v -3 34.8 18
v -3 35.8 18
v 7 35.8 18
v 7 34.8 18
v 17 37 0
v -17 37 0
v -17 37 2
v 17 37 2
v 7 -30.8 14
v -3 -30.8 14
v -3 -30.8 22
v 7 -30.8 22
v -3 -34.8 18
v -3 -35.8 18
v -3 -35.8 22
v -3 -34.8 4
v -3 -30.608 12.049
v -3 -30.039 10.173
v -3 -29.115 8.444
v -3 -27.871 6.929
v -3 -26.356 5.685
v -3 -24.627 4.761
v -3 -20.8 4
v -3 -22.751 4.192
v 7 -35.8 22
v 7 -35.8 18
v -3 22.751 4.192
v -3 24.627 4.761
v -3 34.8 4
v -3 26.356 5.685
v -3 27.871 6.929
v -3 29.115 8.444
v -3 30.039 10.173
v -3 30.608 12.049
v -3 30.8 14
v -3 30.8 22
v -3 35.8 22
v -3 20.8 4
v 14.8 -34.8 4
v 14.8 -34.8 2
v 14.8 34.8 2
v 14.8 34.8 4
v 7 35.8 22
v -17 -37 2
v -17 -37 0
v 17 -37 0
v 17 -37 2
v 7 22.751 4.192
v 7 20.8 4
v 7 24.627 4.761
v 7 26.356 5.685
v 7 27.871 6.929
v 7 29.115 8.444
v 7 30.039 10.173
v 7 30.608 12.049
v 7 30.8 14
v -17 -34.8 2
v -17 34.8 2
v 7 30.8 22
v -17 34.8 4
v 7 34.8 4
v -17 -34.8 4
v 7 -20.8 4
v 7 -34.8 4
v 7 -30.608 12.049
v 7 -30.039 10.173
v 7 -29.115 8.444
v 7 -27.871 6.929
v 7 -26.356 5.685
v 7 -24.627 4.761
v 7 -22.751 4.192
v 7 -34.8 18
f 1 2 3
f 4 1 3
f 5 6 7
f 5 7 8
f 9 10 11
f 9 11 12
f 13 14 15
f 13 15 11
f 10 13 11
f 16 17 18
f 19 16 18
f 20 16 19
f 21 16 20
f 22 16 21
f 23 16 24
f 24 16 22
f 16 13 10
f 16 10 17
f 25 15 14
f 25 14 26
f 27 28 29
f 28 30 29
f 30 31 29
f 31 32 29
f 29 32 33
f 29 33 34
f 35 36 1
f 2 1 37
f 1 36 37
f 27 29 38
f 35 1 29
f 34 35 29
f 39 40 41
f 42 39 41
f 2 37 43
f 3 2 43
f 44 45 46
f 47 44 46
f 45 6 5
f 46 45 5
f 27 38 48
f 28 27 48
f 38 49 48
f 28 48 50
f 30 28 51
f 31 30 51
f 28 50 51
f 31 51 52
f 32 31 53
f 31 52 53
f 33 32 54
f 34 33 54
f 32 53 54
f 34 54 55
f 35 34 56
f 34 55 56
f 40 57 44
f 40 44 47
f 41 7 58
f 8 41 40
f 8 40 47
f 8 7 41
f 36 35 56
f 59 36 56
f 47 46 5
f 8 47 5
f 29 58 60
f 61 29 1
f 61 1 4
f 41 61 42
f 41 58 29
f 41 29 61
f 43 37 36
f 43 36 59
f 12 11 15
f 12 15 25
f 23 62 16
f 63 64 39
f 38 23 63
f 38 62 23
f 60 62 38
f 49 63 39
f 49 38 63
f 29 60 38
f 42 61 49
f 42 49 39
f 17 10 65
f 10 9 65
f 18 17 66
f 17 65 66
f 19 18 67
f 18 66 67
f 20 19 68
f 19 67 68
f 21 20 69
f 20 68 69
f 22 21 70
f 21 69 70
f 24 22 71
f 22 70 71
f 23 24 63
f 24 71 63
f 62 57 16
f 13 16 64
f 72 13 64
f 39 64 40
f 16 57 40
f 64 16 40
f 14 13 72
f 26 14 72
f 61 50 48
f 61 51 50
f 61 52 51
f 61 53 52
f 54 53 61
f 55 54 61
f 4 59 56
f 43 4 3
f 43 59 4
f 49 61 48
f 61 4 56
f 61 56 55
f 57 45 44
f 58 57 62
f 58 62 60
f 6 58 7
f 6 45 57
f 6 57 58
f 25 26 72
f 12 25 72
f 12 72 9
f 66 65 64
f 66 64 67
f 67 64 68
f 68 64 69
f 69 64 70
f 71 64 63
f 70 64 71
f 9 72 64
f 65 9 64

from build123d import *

# Parameters (mm, degrees)
ESQUISSE1_W        = 34
ESQUISSE1_H        = 74
BOSS_EXTRU_1_DEPTH = 2
ESQUISSE2_W        = 31.8
ESQUISSE2_H        = 69.6
BOSS_EXTRU_2_DEPTH = 2
ESQUISSE7_W        = 10
ESQUISSE7_H        = 4
BOSS_EXTRU_5_DEPTH = 18
ESQUISSE8_W        = 10
ESQUISSE8_H        = 1
BOSS_EXTRU_6_DEPTH = 4
CONG_2_R           = 10


with BuildPart() as part:
    # Esquisse1 → Boss.-Extru.1 (new body)
    with BuildSketch(Plane.XY):
        Rectangle(ESQUISSE1_W, ESQUISSE1_H)
    extrude(amount=BOSS_EXTRU_1_DEPTH)

    # Esquisse2 → Boss.-Extru.2 (add)
    with BuildSketch(Plane.XY.offset(2)):
        with Locations((-1.1, 0)):
            Rectangle(ESQUISSE2_W, ESQUISSE2_H)
    extrude(amount=BOSS_EXTRU_2_DEPTH)

    # Esquisse7 → Boss.-Extru.5 (add)
    with BuildSketch(Plane.XY.offset(4)):
        with Locations((2, 32.8)):
            Rectangle(ESQUISSE7_W, ESQUISSE7_H)
        with Locations((2, -32.8)):
            Rectangle(ESQUISSE7_W, ESQUISSE7_H)
    extrude(amount=BOSS_EXTRU_5_DEPTH)

    # Esquisse8 → Boss.-Extru.6 (add)
    with BuildSketch(Plane.XY.offset(22)):
        with Locations((2, 35.3)):
            Rectangle(ESQUISSE8_W, ESQUISSE8_H)
        with Locations((2, -35.3)):
            Rectangle(ESQUISSE8_W, ESQUISSE8_H)
    extrude(amount=-BOSS_EXTRU_6_DEPTH)

    # Congé2
    cong_2_edges = [part.edges().sort_by_distance(p)[0] for p in [
        (2, 30.8, 4),
        (2, -30.8, 4),
    ]]
    fillet(cong_2_edges, radius=CONG_2_R)


solid = part.part
